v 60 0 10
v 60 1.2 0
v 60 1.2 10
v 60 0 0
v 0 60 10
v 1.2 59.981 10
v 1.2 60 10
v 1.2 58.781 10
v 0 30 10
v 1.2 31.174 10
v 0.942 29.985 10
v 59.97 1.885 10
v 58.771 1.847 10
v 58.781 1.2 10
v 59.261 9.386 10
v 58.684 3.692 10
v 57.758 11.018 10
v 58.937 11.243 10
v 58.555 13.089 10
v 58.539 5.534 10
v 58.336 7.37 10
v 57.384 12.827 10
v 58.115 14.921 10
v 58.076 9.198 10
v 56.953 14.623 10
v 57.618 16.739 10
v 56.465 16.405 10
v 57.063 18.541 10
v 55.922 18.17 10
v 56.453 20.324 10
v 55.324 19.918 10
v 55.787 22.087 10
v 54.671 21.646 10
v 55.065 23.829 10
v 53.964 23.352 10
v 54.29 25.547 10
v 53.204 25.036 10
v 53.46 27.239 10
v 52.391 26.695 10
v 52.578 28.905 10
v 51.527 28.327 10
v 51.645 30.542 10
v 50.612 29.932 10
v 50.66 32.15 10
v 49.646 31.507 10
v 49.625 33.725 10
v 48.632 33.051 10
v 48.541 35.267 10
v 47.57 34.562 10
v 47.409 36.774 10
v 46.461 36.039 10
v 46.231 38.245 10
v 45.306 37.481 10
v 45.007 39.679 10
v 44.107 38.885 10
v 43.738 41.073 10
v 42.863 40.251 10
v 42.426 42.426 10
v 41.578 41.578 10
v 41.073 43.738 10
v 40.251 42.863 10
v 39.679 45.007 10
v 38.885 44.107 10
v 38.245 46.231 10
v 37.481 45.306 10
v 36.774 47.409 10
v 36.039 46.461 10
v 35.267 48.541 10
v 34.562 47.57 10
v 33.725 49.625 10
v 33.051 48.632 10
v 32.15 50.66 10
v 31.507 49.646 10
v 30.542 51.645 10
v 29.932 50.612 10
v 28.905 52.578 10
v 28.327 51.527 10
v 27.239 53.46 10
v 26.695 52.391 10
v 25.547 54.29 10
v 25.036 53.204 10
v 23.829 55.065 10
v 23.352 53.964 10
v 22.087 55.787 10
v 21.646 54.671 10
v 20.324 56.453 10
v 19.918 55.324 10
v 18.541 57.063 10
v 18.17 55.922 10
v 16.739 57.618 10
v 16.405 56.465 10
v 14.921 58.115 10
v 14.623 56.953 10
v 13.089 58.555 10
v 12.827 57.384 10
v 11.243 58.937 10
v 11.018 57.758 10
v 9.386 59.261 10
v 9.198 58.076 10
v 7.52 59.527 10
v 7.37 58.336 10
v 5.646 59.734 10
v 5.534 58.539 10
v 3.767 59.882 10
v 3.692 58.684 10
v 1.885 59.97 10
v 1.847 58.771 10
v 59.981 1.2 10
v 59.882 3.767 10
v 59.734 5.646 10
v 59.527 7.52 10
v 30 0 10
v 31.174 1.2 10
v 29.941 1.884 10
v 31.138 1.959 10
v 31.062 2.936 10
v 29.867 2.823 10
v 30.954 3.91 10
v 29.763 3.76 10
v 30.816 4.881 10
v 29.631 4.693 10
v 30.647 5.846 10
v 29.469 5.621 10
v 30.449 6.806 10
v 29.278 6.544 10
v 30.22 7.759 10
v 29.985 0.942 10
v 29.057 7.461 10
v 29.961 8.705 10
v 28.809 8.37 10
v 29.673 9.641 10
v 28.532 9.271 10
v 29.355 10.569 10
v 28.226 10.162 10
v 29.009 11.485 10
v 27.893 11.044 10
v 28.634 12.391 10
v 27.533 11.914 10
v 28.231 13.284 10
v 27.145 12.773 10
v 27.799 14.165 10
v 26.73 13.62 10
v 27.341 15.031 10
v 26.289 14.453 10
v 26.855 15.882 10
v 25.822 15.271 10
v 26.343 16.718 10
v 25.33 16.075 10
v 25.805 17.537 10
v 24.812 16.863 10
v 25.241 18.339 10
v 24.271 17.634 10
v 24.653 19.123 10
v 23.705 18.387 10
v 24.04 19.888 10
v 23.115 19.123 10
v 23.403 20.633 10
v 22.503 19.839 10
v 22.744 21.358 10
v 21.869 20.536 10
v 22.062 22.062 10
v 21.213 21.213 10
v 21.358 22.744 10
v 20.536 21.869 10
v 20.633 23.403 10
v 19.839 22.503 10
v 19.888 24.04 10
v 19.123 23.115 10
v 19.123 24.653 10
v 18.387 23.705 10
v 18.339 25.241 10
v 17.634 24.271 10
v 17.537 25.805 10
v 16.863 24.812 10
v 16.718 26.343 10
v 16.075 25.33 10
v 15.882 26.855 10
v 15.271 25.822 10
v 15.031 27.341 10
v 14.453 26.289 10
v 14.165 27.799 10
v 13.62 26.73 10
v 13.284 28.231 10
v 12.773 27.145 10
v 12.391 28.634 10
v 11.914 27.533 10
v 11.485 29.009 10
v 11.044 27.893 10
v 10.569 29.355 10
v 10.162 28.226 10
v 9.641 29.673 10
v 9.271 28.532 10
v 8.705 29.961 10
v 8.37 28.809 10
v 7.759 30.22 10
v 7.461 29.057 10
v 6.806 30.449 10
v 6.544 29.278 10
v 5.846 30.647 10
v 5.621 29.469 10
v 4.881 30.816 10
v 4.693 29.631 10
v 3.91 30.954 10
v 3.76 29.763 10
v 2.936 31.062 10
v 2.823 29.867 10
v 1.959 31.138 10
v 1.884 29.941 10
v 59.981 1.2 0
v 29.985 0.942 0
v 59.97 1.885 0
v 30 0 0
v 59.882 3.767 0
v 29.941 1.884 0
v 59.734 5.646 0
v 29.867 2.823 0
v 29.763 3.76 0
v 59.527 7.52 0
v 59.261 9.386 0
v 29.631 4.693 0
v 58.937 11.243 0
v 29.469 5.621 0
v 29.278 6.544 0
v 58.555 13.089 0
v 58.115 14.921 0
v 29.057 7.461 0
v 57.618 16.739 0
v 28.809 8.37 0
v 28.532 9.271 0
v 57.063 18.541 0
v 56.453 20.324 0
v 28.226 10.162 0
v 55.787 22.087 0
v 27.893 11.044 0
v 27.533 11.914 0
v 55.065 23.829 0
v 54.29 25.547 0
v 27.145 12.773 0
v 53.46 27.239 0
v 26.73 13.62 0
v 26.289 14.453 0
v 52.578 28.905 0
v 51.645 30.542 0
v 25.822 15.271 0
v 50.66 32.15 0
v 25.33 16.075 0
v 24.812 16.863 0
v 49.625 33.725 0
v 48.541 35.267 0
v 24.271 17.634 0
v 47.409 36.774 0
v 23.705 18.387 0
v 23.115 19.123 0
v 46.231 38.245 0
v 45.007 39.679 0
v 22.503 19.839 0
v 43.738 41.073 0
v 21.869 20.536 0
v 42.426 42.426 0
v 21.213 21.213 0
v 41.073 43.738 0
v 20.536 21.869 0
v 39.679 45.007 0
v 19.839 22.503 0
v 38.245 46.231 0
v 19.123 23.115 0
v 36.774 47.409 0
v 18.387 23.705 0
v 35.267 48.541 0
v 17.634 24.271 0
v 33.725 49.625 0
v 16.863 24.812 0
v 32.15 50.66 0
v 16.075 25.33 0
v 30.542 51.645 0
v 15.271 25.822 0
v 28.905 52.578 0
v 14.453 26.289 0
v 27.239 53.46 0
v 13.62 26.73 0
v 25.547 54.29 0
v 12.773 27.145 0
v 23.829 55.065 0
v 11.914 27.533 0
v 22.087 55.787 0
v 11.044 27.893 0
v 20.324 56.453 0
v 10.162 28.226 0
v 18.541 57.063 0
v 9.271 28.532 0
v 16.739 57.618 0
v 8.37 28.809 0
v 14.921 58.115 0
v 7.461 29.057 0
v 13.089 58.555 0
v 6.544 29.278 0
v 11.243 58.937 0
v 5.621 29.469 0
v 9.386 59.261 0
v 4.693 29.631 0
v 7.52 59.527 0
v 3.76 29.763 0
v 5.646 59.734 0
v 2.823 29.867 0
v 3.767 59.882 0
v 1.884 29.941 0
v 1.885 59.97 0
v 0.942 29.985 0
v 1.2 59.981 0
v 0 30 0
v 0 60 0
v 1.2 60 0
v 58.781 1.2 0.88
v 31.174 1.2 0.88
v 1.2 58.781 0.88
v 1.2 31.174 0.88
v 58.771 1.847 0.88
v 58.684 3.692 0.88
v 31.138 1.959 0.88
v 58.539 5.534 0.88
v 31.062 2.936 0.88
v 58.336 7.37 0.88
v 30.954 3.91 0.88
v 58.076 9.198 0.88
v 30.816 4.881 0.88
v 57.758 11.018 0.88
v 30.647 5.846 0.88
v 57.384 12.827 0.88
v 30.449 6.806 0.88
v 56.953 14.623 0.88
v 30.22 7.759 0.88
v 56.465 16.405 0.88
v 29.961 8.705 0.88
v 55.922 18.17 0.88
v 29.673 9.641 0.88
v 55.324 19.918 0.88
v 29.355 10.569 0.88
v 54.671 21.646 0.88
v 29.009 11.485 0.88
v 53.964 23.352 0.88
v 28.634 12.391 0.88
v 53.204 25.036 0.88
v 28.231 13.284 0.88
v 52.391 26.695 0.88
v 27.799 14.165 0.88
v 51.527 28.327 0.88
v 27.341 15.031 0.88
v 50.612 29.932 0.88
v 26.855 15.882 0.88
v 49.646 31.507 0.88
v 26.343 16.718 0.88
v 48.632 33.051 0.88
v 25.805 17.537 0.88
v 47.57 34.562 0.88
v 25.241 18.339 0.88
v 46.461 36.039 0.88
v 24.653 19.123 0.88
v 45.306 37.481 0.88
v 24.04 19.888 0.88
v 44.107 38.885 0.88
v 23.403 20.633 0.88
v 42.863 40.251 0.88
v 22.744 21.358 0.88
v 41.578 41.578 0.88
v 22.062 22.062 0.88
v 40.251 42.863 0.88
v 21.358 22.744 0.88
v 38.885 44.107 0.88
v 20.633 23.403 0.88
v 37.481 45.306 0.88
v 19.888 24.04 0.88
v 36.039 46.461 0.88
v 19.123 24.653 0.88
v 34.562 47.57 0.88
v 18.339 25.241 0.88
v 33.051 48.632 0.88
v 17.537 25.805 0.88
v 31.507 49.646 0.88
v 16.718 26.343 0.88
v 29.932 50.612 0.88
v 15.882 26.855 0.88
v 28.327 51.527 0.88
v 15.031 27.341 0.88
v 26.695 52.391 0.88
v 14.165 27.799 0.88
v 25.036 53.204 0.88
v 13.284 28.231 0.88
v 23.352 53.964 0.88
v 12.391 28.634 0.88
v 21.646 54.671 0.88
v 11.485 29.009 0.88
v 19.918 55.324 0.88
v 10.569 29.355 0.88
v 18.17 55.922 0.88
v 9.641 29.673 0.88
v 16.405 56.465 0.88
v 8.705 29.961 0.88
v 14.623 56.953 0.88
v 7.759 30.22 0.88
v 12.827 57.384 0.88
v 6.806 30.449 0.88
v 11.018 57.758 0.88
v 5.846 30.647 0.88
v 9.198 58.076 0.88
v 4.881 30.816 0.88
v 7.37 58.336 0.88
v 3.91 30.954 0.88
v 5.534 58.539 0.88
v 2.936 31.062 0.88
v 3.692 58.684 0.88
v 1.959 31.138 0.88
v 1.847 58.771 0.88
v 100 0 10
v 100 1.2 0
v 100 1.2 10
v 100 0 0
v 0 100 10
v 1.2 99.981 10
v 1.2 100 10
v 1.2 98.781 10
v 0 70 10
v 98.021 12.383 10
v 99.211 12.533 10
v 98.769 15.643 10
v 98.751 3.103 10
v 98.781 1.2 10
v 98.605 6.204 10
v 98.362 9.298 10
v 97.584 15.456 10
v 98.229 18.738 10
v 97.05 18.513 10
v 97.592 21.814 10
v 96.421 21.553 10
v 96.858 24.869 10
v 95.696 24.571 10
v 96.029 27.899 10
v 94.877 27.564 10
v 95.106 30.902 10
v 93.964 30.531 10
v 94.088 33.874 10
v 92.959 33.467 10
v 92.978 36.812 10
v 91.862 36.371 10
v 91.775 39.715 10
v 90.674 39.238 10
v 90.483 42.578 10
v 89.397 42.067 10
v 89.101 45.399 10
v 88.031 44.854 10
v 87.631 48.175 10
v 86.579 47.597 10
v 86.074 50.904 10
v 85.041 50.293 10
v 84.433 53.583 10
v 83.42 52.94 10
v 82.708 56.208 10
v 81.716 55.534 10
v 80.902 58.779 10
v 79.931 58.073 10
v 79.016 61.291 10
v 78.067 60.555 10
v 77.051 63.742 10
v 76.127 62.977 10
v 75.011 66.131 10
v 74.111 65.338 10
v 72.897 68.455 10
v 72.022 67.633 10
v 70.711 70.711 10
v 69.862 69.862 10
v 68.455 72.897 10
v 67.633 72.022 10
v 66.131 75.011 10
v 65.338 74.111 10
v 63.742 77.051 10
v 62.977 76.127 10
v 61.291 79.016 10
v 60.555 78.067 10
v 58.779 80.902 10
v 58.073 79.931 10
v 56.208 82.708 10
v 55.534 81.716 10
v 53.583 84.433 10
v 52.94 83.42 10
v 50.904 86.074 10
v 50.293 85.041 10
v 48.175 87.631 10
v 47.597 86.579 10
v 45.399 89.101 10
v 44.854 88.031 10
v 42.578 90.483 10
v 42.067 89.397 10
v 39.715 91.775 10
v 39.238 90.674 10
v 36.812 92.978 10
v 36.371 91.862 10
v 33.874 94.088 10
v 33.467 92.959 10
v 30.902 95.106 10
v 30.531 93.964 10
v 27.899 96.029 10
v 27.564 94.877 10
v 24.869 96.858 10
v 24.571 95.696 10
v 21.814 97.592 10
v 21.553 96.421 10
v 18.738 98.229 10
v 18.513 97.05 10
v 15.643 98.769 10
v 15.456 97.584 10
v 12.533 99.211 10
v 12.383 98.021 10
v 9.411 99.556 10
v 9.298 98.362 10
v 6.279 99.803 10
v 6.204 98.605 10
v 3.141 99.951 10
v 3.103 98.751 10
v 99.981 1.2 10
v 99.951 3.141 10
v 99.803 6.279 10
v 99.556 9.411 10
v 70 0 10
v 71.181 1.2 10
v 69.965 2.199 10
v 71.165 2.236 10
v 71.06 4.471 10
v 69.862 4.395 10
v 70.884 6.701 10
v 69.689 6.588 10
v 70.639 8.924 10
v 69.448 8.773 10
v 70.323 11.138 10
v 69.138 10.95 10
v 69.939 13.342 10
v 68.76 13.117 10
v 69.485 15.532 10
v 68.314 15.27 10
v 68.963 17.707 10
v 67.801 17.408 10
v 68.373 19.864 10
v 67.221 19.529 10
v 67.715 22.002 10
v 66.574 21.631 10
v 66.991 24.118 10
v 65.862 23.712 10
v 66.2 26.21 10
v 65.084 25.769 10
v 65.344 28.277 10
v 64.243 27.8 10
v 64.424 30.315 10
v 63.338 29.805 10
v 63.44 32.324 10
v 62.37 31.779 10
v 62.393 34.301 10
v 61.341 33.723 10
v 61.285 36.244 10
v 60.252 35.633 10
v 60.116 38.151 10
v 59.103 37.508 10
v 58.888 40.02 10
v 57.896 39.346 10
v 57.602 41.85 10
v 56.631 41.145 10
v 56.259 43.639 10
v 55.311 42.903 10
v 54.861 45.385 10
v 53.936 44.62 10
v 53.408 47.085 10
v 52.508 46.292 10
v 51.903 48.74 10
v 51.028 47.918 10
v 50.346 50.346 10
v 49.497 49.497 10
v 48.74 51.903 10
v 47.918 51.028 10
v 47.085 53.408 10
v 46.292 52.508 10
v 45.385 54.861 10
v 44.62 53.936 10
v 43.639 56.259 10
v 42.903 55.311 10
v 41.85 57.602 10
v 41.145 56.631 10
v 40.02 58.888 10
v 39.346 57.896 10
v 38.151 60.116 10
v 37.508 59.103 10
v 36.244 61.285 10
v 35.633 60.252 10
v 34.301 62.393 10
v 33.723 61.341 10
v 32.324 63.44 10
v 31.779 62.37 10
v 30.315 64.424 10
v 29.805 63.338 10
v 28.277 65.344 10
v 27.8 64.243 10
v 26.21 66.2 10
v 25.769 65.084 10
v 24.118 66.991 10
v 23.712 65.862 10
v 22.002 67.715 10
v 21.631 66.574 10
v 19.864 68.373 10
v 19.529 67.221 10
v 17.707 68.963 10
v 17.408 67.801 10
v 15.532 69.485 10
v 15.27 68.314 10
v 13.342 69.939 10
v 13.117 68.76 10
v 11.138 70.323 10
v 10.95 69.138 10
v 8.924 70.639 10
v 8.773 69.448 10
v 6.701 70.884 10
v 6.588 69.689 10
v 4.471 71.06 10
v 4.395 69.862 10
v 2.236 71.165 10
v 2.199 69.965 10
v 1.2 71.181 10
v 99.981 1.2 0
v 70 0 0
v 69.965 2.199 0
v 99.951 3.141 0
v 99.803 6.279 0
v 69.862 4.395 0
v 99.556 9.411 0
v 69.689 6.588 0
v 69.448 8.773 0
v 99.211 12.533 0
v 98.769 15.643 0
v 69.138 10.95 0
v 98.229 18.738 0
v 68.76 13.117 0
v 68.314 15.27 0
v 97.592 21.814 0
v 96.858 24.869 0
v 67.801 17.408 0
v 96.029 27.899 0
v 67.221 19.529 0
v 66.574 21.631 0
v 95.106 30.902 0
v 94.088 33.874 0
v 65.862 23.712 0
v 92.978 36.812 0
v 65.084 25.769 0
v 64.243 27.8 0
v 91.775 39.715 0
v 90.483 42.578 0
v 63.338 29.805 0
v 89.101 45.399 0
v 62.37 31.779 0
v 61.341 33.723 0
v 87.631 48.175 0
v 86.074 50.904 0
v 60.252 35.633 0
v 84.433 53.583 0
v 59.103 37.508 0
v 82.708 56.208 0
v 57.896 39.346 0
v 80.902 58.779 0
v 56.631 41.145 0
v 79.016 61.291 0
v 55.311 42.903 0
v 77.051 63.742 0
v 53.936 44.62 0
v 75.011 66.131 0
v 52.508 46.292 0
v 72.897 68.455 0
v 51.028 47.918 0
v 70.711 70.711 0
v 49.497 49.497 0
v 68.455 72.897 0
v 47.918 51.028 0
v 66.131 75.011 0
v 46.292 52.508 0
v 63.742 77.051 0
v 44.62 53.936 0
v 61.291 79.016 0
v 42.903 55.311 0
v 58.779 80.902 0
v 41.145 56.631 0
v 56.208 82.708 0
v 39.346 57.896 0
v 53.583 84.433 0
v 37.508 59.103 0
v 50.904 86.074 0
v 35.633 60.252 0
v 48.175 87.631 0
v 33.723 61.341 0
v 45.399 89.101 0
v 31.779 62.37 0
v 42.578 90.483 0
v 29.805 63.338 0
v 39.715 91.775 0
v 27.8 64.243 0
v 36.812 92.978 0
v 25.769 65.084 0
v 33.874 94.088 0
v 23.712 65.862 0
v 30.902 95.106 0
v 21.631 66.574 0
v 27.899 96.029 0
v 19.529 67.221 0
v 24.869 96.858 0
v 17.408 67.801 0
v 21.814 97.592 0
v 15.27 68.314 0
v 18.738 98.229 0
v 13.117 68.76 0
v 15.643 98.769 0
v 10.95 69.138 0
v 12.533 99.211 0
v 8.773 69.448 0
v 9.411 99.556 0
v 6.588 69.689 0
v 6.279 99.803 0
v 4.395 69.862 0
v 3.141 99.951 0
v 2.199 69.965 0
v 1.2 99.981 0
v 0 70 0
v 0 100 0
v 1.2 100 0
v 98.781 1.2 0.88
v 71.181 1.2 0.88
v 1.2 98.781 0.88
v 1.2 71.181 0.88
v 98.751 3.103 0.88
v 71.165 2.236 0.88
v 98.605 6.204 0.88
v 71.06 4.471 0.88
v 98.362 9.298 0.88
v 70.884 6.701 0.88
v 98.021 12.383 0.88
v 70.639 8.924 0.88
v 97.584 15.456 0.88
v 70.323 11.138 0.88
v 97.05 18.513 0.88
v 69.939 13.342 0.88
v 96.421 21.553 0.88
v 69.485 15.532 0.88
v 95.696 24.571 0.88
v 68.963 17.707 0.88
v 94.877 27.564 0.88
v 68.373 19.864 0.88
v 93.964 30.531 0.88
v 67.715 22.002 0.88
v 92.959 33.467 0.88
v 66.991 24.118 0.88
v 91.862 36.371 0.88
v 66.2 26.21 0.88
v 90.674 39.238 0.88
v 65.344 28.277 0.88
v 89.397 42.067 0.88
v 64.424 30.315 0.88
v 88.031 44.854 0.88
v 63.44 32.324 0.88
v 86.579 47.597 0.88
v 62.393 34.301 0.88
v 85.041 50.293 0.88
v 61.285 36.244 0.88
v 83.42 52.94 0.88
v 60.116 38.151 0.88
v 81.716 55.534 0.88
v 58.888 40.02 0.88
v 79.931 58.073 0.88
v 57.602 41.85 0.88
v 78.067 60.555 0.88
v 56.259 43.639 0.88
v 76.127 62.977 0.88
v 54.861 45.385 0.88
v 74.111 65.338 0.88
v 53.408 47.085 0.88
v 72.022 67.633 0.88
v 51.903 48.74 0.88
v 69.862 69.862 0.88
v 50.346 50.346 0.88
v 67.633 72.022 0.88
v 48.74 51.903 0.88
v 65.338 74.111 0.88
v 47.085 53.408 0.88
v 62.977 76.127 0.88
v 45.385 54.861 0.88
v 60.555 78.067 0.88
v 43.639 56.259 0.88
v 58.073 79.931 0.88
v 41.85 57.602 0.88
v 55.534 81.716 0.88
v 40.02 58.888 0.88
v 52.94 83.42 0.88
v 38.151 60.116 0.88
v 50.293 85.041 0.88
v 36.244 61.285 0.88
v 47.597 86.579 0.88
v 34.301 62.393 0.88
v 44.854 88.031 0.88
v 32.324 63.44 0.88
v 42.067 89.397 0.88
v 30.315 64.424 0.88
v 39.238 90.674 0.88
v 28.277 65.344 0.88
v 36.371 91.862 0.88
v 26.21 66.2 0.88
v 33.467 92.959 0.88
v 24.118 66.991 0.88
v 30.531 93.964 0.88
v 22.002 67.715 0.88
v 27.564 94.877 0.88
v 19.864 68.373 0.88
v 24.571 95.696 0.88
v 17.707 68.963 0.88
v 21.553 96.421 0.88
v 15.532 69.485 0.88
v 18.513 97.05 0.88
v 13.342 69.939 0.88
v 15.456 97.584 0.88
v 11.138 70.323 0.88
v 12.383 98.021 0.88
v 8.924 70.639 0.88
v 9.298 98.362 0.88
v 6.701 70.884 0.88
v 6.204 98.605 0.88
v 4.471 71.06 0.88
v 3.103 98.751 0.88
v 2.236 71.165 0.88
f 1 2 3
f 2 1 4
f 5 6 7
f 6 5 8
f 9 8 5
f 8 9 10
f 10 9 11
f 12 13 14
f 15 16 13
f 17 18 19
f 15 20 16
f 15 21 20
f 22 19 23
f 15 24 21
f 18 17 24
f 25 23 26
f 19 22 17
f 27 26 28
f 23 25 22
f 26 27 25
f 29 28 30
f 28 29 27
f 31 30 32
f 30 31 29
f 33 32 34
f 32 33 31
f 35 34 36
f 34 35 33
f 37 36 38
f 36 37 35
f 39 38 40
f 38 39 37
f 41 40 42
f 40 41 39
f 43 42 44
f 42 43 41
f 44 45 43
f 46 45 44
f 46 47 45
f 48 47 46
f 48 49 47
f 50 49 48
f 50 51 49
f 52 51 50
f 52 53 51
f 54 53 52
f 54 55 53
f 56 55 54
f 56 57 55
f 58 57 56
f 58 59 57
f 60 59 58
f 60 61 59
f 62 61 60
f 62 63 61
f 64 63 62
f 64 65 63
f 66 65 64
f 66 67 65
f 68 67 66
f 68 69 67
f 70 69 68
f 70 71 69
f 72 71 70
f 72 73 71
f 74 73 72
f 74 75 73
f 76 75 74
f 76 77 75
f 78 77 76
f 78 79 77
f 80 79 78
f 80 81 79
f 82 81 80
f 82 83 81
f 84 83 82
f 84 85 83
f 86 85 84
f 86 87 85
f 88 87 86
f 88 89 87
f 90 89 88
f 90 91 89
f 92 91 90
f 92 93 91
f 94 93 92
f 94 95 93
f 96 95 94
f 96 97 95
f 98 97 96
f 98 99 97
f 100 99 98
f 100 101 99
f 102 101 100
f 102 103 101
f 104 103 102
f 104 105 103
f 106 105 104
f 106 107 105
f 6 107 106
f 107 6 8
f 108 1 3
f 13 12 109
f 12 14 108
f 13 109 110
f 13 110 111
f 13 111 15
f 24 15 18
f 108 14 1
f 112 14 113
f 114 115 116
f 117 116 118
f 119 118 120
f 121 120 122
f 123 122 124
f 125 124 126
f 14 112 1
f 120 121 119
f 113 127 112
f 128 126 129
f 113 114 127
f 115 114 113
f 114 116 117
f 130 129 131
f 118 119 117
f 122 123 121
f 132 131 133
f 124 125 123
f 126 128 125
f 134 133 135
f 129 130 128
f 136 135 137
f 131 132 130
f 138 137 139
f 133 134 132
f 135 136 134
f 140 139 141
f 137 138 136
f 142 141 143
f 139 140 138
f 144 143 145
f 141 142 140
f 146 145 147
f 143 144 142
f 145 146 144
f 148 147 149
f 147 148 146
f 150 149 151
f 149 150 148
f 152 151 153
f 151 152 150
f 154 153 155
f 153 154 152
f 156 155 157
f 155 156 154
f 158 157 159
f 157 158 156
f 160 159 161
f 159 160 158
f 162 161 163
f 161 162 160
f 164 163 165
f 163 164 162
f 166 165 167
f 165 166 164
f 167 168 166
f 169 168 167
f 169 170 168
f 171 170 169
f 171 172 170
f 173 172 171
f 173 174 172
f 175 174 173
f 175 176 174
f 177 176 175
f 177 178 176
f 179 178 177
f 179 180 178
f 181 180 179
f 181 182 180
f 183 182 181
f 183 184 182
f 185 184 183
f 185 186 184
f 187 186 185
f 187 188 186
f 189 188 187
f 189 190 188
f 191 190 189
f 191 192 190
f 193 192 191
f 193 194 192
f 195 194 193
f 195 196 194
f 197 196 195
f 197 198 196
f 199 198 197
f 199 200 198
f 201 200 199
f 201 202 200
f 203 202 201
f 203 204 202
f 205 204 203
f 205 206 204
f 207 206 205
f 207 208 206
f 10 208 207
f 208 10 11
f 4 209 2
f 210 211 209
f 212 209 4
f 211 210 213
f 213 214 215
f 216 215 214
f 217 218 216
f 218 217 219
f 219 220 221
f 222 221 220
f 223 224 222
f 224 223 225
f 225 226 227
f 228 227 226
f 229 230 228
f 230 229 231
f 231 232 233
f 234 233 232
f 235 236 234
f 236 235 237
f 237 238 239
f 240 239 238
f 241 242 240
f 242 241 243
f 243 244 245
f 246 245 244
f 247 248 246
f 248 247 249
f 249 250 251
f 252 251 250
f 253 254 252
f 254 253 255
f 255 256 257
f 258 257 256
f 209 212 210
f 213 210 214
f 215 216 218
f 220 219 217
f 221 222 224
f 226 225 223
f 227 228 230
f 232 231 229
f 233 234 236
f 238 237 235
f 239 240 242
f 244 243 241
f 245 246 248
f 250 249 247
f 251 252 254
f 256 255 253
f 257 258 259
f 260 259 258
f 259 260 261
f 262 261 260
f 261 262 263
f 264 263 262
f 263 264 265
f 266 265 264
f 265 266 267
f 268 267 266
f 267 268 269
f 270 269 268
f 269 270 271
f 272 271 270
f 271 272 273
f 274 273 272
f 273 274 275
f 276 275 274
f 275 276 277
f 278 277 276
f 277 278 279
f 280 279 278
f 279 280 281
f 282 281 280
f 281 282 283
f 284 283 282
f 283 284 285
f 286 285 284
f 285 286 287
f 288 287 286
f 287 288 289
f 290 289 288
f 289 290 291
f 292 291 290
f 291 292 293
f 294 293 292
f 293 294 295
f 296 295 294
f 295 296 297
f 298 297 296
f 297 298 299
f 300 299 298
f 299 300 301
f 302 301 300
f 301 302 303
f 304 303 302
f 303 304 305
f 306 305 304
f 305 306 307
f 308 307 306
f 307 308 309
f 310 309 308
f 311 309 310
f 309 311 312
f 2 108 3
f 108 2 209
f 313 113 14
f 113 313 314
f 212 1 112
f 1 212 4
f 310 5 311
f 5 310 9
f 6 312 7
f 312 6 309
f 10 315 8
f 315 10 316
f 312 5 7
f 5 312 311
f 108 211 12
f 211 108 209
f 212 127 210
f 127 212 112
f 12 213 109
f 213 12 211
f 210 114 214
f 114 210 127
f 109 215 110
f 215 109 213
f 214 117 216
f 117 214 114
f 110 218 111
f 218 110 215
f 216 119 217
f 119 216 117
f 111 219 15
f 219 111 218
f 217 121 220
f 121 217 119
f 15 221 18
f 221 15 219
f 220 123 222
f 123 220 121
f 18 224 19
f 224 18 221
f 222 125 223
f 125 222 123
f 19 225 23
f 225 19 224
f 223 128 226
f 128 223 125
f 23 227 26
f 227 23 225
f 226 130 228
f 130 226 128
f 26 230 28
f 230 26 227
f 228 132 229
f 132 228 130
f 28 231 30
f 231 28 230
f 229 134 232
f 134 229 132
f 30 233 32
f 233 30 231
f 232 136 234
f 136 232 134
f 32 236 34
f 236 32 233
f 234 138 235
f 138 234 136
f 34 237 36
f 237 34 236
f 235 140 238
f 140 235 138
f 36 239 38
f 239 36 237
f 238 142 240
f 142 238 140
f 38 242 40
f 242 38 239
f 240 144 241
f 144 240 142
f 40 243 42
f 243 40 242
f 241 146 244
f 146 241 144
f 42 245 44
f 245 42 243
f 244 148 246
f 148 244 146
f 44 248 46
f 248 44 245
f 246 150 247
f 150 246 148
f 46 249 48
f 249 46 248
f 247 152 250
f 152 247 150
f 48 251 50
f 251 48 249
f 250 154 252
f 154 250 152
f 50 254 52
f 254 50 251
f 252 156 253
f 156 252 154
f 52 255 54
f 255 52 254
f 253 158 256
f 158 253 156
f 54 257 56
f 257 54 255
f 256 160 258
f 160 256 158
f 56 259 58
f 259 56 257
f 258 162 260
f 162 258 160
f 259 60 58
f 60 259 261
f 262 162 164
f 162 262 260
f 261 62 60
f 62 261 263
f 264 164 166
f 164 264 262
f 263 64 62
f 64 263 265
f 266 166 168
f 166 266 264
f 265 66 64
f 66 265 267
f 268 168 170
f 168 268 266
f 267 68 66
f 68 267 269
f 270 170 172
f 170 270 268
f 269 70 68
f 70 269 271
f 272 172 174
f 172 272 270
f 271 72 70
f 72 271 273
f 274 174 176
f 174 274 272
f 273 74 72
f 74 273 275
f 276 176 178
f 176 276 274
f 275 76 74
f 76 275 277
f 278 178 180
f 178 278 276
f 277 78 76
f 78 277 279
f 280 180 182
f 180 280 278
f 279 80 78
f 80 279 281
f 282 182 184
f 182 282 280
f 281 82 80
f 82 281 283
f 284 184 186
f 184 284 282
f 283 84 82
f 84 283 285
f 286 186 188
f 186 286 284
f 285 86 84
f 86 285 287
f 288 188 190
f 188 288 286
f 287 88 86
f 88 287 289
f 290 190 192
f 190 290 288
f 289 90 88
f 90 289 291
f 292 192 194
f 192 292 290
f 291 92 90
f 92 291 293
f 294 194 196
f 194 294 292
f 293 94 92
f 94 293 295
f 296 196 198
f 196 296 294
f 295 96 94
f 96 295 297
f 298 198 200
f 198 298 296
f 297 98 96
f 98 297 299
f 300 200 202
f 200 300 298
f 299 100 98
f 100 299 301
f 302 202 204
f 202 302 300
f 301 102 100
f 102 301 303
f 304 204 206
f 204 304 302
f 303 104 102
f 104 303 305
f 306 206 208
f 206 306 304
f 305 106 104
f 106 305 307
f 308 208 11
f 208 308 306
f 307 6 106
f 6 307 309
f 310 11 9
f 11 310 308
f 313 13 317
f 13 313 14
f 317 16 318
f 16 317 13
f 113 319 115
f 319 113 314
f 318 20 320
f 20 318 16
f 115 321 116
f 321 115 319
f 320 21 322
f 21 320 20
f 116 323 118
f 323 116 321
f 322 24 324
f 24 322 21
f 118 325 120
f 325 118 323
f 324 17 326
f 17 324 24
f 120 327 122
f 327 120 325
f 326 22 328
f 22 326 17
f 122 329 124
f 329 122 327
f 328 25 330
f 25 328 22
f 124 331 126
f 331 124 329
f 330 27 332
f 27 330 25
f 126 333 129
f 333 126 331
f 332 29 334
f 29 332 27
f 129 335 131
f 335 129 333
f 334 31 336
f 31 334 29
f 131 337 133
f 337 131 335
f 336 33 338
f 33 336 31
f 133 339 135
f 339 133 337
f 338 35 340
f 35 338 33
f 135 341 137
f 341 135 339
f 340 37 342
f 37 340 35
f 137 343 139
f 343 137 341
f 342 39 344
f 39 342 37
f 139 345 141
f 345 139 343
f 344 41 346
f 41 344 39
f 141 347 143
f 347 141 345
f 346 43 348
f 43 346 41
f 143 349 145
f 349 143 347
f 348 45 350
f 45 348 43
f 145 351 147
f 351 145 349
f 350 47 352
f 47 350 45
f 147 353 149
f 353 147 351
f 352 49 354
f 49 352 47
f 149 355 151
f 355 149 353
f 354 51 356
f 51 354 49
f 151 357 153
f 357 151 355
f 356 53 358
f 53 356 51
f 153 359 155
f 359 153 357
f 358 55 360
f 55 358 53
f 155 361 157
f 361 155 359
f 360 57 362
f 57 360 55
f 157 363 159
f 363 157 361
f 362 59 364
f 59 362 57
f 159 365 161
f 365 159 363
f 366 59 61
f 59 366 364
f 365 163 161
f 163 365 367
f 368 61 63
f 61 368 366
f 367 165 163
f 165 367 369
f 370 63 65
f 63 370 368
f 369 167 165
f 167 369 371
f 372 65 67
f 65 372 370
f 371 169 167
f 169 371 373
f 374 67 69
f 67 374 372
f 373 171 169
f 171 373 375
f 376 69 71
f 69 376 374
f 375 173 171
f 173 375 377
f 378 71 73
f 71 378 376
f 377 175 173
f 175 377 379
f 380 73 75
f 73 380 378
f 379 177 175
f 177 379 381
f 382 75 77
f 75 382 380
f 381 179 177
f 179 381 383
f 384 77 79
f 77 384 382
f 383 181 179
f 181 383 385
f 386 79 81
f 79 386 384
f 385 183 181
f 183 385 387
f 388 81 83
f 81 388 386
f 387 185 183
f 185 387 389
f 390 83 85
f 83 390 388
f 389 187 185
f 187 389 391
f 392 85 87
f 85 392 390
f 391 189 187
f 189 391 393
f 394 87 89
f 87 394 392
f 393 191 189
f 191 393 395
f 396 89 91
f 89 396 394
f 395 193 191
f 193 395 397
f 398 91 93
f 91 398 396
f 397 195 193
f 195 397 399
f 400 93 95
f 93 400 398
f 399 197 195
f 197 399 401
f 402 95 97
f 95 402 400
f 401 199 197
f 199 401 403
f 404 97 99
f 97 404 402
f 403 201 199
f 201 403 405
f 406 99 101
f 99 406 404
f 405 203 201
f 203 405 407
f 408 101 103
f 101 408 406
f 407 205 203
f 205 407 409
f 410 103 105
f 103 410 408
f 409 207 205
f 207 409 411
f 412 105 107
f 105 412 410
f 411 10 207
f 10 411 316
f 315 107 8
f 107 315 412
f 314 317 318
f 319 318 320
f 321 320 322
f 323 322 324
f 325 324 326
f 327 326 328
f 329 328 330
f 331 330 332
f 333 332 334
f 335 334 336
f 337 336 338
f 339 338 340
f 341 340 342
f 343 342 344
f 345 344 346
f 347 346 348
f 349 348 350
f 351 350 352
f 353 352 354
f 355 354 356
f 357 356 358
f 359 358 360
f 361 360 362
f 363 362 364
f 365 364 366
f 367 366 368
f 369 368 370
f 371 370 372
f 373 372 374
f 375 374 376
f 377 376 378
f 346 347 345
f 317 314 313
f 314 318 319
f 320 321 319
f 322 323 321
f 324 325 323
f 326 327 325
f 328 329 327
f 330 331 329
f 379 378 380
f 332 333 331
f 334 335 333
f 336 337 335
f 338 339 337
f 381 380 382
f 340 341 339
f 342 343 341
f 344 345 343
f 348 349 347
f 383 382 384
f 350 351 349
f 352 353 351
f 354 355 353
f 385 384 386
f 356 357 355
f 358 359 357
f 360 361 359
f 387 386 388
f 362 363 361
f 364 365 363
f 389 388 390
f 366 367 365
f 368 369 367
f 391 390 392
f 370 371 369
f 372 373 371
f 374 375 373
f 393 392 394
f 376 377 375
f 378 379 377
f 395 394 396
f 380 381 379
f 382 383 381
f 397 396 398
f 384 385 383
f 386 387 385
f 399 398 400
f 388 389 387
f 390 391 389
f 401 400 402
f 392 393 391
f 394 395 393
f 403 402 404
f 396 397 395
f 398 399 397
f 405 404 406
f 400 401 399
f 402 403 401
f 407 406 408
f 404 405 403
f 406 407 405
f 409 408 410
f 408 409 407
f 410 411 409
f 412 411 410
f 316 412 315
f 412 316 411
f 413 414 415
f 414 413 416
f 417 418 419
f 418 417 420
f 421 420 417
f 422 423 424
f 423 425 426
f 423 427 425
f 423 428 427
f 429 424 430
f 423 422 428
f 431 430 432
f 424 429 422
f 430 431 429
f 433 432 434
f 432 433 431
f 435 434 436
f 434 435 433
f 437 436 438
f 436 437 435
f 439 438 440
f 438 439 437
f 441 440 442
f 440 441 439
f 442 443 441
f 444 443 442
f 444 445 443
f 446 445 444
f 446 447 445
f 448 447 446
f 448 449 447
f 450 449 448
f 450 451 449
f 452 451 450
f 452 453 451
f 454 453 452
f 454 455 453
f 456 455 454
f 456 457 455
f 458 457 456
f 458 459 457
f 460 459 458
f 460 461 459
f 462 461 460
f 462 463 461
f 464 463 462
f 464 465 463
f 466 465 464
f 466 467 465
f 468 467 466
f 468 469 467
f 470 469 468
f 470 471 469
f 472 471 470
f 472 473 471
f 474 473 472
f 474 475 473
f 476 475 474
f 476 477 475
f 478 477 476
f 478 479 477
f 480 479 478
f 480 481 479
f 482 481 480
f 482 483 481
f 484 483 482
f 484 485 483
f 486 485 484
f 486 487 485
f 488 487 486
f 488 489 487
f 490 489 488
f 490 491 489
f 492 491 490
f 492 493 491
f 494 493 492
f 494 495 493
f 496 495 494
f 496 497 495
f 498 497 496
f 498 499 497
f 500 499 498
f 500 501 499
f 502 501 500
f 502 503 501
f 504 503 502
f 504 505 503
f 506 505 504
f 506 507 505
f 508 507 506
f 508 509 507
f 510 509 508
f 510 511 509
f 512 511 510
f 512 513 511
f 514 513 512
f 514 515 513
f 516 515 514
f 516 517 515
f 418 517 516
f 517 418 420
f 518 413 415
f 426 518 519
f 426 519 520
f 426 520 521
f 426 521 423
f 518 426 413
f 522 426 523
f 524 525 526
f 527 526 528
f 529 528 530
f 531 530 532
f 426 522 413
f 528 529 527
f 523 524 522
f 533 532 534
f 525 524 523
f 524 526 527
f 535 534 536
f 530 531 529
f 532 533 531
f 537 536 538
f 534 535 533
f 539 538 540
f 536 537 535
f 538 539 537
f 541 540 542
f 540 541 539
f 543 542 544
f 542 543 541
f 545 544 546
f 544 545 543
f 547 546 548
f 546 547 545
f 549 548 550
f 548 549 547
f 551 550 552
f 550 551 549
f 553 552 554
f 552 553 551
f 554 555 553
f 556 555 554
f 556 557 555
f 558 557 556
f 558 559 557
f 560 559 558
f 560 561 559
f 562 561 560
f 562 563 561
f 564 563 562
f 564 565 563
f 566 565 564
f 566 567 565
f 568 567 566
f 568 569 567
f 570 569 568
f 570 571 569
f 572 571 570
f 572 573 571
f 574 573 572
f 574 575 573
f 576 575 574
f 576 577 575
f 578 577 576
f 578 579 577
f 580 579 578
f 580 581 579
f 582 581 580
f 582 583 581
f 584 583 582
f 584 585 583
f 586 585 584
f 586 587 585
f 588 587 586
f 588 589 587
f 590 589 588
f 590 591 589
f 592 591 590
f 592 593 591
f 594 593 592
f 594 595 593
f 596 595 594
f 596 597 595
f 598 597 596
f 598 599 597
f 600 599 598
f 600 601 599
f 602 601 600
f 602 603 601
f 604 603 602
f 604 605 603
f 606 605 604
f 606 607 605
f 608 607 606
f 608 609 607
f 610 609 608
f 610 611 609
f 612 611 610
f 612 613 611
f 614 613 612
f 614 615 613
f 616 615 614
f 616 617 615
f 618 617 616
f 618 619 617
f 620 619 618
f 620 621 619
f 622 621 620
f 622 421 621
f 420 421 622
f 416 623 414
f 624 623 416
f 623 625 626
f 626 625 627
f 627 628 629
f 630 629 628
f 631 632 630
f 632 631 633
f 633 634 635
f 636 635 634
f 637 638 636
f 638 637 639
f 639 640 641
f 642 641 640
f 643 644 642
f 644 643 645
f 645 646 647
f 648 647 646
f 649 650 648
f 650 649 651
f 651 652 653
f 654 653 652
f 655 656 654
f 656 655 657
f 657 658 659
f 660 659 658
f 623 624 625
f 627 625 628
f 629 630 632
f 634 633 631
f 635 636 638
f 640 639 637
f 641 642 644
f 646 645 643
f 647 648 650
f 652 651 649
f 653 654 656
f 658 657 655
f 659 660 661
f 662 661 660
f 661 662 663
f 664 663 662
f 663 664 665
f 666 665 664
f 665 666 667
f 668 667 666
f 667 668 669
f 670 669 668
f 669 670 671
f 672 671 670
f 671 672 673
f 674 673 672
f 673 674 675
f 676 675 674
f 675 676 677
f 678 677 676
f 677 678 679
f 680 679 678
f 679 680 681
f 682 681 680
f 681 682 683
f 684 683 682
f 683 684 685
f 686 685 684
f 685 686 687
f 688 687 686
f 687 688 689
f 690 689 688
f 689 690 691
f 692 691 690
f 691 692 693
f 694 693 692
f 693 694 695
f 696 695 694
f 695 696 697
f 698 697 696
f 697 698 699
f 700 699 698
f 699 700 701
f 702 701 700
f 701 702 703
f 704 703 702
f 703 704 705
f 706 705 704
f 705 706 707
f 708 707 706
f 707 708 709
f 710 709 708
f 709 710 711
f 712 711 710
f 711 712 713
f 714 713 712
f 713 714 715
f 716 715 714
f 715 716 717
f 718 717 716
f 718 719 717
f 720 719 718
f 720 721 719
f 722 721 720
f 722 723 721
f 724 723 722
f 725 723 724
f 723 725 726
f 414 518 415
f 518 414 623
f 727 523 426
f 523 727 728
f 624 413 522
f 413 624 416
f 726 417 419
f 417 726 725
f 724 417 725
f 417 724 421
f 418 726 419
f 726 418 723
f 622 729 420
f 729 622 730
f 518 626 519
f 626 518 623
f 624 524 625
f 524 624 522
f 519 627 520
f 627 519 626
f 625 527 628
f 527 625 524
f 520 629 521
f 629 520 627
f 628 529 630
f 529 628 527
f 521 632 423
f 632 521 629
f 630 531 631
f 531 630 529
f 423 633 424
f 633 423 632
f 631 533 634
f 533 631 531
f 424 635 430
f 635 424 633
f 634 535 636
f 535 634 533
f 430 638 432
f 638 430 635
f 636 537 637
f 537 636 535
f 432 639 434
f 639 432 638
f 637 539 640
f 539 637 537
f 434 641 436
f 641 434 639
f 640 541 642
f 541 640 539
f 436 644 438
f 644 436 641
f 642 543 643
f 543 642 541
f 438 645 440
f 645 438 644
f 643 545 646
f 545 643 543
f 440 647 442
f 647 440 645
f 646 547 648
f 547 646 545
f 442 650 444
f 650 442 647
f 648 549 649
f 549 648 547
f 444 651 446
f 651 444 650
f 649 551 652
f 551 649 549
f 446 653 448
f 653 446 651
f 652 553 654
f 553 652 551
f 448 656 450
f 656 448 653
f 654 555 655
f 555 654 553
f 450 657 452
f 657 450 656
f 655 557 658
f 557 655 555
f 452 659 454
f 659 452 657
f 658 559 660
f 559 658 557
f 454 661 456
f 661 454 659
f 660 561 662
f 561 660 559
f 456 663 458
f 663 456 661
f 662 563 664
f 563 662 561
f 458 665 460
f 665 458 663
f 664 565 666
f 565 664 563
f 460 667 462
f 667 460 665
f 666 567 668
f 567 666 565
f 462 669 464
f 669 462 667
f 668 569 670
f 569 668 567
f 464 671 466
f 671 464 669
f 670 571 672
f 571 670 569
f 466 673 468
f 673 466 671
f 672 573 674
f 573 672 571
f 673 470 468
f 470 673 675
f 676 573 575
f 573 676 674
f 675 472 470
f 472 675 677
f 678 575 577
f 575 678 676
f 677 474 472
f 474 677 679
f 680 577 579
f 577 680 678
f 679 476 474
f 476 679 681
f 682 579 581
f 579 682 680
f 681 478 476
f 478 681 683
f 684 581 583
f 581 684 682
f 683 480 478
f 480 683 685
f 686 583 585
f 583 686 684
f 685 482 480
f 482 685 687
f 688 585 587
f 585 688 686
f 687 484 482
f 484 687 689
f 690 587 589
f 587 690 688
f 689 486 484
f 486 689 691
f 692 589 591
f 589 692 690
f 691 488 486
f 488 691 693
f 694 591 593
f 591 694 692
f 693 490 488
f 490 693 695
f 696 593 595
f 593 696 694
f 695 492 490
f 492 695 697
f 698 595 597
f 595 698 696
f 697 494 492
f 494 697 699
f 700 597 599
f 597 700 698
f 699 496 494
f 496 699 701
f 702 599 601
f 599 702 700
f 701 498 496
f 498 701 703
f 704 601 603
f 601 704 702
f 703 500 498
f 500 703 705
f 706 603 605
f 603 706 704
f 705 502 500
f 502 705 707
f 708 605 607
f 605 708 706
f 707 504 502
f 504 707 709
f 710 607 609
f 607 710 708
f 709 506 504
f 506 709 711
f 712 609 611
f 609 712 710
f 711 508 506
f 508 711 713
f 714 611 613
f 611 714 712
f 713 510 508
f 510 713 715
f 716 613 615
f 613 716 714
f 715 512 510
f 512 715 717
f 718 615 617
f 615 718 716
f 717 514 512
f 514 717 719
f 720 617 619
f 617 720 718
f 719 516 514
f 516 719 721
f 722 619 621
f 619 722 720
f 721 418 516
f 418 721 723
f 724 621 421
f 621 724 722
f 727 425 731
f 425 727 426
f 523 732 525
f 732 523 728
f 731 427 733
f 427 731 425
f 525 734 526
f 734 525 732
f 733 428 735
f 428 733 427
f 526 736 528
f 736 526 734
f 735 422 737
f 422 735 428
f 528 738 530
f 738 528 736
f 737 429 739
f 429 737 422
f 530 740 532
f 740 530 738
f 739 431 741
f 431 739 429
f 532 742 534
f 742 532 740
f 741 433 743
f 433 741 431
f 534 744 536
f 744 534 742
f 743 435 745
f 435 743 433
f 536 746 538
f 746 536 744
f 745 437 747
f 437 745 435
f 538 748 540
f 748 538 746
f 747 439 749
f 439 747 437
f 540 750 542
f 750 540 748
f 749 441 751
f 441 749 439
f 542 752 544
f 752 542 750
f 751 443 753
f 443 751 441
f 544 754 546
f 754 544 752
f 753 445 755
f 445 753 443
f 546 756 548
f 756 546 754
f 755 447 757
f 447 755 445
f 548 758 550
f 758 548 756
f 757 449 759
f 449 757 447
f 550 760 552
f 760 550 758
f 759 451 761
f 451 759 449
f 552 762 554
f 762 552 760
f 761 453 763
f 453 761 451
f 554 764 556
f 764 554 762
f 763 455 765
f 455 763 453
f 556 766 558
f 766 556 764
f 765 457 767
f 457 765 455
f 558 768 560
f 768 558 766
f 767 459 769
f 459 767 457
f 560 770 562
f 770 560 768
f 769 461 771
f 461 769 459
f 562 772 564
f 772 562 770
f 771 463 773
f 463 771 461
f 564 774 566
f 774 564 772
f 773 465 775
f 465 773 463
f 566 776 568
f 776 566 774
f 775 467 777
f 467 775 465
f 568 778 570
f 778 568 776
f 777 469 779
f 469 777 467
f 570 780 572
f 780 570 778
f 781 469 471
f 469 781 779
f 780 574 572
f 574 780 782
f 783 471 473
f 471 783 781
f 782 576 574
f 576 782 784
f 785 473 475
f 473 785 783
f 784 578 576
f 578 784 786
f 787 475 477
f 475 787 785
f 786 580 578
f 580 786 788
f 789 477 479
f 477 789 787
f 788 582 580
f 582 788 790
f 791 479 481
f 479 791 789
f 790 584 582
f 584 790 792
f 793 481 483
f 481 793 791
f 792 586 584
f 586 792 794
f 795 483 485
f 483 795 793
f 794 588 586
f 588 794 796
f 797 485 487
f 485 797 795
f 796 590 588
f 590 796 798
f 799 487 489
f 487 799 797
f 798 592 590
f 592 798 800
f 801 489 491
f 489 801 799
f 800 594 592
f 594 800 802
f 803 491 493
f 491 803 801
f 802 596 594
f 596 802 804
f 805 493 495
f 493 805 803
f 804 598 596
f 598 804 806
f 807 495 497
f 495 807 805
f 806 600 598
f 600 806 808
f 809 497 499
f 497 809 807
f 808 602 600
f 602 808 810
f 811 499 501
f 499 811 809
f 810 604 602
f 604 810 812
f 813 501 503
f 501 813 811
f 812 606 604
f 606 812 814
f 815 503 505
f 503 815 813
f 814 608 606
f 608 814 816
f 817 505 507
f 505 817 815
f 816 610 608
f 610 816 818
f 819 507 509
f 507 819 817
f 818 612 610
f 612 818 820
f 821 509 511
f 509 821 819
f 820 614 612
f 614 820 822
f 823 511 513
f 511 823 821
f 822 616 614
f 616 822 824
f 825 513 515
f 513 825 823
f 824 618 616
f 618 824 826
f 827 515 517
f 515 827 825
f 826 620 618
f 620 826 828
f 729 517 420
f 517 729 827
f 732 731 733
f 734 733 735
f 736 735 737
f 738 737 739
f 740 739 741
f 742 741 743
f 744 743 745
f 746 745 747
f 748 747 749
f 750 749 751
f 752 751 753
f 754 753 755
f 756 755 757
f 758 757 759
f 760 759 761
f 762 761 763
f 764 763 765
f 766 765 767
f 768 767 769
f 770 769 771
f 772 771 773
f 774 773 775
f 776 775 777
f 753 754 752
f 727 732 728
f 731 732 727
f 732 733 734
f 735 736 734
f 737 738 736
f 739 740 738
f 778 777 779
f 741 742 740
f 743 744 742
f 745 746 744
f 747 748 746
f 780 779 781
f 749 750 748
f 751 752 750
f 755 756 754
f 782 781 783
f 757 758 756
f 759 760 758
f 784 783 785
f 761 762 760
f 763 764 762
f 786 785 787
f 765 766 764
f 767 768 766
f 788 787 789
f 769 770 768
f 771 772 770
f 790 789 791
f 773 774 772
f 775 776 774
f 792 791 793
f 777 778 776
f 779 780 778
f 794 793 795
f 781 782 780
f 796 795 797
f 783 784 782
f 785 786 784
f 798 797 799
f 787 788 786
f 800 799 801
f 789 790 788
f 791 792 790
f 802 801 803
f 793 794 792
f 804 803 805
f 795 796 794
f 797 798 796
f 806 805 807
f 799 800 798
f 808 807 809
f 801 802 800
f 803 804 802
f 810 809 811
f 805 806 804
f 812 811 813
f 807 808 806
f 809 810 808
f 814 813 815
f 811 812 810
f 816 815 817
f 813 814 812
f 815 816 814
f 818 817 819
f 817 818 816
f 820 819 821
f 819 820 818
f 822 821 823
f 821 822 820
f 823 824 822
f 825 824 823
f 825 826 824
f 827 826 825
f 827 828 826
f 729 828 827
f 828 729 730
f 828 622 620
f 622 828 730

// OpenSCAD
/* Note 


*/


/*set to tray dimmensions in mm*/
noz_w = 0.4; //nozzle width mm
num_walls = 3; //number of walls

/*Set to printer specs...
  These values will be used to calculate prints that
  do not require an infill. 
  This should reduce retracts and result 
  in better quality and faster prints. 
*/
lay_h=0.2;
lay_1=0.28;
base_layers=4;


/*Tray specs*/
tray_w=30; 
tray_d=10;

/*Pot specs set to radius of pot...
*  Radius = half the diameter 
*  There are 25.4mm to an inch 
*
*  i.e. 
*  5.5 inch pot
*	5.5in * 25.4mm = 139.7mm
*	140/2 = 70mm
*	pot is 10mm thick
*	70 - 10 = 60mm
*
*/

pot_od = 70;
pot_id = 60;

/*how much tray...*/
angle=90;


/*------------No Touch Below------------*/

/*calculated values*/

base_thk = lay_1 + ((base_layers-1) * lay_h);

/*supporting functions*/

module tray () {
	rotate_extrude(angle=angle, $fn=200)
	translate([pot_od,0,0])
	square([tray_w,tray_d]);
}


module tray_void(){
	rotate_extrude(angle=angle, $fn=200)
	//offset on 3 axis
	translate([pot_od + (noz_w*num_walls),base_thk])
	square([tray_w - ((noz_w*num_walls)*2),tray_d]);
}


module tray_in () {
	rotate_extrude(angle=angle, $fn=200)
	translate([pot_id - tray_w,0,0])
	square([tray_w,tray_d]);
}

module tray_in_void(){
	rotate_extrude(angle=angle, $fn=200)
	//offset on 3 axis
	translate([pot_id - tray_w + (noz_w*num_walls),base_thk])
	square([tray_w - ((noz_w*num_walls)*2),tray_d]);
}


module tray_ends(){
	//end 1
	translate([pot_od,0,0])
	cube([tray_w,(noz_w*num_walls),tray_d]);
	//end 2
	rotate([0,0,angle])
	translate([pot_od,-(noz_w*num_walls),0])
	cube([tray_w,(noz_w*num_walls),tray_d]);
}



module tray_in_ends(){
	//end 1
	translate([pot_id - tray_w,0,0])
	cube([tray_w,(noz_w*num_walls),tray_d]);
	//end 2
	rotate([0,0,angle])
	translate([pot_id - tray_w ,-(noz_w*num_walls),0])
	cube([tray_w,(noz_w*num_walls),tray_d]);
}


/*Higher order functinos */

module outer_tray(){
	//OD Tray
	union(){
		tray_ends();
		difference(){
			tray();
			color("blue")
			tray_void();
		}
	}
}

module inner_tray(){
	//ID Tray
	union(){
		tray_in_ends();
		difference(){
			tray_in();
			color("blue")
			tray_in_void();
		}
	}
}



/*---------Main------------*/

// Comment out here to produce only one tray.....

// e.g. 

//inner_tray();

inner_tray();

outer_tray();
